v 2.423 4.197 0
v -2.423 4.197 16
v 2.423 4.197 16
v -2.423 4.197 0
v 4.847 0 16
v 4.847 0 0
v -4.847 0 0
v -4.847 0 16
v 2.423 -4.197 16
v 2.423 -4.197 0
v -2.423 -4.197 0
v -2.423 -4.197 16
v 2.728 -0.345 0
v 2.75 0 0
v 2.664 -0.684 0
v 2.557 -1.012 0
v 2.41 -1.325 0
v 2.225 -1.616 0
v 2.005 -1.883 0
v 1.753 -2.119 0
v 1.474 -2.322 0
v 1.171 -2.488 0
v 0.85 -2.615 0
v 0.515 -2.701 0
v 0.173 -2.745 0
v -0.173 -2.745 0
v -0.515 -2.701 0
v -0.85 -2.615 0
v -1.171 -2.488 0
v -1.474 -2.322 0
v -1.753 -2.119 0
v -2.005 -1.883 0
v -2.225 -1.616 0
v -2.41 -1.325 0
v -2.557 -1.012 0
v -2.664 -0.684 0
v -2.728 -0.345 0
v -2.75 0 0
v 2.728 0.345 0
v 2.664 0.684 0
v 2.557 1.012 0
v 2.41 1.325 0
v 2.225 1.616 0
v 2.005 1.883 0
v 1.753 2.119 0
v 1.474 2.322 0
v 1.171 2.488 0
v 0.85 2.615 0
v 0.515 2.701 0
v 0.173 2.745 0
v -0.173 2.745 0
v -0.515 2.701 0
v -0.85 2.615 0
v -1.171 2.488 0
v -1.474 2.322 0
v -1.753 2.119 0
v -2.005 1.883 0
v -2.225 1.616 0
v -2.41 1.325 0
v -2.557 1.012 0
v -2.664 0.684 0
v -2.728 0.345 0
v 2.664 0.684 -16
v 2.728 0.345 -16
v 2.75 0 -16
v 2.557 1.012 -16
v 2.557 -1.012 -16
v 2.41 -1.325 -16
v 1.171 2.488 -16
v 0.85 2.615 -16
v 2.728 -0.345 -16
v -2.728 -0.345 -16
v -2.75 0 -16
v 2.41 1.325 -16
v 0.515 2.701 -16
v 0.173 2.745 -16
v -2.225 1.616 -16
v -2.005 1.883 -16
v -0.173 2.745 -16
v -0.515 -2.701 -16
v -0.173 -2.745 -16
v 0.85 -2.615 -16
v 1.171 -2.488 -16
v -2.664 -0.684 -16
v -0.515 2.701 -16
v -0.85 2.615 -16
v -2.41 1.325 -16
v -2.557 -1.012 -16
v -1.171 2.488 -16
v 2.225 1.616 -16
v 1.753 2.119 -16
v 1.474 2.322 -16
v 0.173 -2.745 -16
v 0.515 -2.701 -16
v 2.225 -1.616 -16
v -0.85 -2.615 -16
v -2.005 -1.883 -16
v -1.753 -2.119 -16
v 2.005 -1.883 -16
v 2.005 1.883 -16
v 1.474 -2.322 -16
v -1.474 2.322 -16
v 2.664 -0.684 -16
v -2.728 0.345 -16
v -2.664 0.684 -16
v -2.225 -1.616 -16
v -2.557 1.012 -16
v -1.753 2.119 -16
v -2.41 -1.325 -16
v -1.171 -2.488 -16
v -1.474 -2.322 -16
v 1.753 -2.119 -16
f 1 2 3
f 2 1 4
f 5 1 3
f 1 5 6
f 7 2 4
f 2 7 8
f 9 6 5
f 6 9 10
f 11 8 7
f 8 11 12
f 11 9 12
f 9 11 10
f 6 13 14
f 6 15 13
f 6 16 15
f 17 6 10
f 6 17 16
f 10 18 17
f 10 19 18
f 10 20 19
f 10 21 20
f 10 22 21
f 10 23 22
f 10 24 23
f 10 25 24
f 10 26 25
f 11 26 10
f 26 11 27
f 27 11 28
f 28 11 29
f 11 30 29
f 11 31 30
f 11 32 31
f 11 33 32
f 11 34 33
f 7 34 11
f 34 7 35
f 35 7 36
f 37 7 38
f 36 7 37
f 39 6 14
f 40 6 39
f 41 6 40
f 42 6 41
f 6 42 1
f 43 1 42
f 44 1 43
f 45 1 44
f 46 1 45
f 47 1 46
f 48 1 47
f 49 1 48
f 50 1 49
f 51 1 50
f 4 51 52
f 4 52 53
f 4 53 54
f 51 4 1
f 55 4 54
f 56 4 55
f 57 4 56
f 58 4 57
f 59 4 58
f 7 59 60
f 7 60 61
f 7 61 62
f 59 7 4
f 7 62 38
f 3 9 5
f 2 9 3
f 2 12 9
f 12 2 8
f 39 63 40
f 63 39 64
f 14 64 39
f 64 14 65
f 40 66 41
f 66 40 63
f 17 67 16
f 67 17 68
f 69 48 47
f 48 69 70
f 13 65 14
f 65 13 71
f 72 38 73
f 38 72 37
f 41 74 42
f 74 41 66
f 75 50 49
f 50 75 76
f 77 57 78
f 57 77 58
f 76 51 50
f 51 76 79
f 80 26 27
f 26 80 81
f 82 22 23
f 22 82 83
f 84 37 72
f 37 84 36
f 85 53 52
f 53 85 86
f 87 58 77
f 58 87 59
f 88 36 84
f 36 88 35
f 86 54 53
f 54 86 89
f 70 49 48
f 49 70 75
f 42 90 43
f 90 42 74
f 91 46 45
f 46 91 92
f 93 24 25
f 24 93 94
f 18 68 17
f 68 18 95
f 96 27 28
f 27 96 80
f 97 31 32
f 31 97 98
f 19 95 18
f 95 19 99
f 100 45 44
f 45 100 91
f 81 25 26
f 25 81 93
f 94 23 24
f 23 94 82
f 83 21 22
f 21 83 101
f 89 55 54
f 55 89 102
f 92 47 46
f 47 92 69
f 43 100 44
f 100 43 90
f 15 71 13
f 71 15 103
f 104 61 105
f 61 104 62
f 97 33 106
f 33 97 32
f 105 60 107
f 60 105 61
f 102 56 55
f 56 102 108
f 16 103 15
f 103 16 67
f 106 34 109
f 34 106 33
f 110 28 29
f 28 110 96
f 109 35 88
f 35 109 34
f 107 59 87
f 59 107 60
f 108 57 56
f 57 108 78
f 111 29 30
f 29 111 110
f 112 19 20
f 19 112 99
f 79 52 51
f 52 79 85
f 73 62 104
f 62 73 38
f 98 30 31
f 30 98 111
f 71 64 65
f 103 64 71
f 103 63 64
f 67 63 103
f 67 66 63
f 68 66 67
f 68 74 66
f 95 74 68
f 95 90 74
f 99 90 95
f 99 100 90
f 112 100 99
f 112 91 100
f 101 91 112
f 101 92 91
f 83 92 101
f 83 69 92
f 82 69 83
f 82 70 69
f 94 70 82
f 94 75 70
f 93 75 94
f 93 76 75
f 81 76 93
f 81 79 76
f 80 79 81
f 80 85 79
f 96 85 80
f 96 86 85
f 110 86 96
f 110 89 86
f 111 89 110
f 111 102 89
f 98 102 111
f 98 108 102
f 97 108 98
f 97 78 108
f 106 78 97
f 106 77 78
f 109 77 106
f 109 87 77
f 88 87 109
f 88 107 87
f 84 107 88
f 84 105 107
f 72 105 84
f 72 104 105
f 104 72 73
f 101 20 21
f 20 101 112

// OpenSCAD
$fn = 50;


difference() {
	union() {
		linear_extrude(height = 16) {
			polygon(points = [[4.8468000000, 0.0000000000], [2.4234000000, 4.1974519271], [-2.4234000000, 4.1974519271], [-4.8468000000, 0.0000000000], [-2.4234000000, -4.1974519271], [2.4234000000, -4.1974519271]]);
		}
		translate(v = [0, 0, -16]) {
			cylinder(h = 16, r = 2.7500000000);
		}
	}
	union();
}
